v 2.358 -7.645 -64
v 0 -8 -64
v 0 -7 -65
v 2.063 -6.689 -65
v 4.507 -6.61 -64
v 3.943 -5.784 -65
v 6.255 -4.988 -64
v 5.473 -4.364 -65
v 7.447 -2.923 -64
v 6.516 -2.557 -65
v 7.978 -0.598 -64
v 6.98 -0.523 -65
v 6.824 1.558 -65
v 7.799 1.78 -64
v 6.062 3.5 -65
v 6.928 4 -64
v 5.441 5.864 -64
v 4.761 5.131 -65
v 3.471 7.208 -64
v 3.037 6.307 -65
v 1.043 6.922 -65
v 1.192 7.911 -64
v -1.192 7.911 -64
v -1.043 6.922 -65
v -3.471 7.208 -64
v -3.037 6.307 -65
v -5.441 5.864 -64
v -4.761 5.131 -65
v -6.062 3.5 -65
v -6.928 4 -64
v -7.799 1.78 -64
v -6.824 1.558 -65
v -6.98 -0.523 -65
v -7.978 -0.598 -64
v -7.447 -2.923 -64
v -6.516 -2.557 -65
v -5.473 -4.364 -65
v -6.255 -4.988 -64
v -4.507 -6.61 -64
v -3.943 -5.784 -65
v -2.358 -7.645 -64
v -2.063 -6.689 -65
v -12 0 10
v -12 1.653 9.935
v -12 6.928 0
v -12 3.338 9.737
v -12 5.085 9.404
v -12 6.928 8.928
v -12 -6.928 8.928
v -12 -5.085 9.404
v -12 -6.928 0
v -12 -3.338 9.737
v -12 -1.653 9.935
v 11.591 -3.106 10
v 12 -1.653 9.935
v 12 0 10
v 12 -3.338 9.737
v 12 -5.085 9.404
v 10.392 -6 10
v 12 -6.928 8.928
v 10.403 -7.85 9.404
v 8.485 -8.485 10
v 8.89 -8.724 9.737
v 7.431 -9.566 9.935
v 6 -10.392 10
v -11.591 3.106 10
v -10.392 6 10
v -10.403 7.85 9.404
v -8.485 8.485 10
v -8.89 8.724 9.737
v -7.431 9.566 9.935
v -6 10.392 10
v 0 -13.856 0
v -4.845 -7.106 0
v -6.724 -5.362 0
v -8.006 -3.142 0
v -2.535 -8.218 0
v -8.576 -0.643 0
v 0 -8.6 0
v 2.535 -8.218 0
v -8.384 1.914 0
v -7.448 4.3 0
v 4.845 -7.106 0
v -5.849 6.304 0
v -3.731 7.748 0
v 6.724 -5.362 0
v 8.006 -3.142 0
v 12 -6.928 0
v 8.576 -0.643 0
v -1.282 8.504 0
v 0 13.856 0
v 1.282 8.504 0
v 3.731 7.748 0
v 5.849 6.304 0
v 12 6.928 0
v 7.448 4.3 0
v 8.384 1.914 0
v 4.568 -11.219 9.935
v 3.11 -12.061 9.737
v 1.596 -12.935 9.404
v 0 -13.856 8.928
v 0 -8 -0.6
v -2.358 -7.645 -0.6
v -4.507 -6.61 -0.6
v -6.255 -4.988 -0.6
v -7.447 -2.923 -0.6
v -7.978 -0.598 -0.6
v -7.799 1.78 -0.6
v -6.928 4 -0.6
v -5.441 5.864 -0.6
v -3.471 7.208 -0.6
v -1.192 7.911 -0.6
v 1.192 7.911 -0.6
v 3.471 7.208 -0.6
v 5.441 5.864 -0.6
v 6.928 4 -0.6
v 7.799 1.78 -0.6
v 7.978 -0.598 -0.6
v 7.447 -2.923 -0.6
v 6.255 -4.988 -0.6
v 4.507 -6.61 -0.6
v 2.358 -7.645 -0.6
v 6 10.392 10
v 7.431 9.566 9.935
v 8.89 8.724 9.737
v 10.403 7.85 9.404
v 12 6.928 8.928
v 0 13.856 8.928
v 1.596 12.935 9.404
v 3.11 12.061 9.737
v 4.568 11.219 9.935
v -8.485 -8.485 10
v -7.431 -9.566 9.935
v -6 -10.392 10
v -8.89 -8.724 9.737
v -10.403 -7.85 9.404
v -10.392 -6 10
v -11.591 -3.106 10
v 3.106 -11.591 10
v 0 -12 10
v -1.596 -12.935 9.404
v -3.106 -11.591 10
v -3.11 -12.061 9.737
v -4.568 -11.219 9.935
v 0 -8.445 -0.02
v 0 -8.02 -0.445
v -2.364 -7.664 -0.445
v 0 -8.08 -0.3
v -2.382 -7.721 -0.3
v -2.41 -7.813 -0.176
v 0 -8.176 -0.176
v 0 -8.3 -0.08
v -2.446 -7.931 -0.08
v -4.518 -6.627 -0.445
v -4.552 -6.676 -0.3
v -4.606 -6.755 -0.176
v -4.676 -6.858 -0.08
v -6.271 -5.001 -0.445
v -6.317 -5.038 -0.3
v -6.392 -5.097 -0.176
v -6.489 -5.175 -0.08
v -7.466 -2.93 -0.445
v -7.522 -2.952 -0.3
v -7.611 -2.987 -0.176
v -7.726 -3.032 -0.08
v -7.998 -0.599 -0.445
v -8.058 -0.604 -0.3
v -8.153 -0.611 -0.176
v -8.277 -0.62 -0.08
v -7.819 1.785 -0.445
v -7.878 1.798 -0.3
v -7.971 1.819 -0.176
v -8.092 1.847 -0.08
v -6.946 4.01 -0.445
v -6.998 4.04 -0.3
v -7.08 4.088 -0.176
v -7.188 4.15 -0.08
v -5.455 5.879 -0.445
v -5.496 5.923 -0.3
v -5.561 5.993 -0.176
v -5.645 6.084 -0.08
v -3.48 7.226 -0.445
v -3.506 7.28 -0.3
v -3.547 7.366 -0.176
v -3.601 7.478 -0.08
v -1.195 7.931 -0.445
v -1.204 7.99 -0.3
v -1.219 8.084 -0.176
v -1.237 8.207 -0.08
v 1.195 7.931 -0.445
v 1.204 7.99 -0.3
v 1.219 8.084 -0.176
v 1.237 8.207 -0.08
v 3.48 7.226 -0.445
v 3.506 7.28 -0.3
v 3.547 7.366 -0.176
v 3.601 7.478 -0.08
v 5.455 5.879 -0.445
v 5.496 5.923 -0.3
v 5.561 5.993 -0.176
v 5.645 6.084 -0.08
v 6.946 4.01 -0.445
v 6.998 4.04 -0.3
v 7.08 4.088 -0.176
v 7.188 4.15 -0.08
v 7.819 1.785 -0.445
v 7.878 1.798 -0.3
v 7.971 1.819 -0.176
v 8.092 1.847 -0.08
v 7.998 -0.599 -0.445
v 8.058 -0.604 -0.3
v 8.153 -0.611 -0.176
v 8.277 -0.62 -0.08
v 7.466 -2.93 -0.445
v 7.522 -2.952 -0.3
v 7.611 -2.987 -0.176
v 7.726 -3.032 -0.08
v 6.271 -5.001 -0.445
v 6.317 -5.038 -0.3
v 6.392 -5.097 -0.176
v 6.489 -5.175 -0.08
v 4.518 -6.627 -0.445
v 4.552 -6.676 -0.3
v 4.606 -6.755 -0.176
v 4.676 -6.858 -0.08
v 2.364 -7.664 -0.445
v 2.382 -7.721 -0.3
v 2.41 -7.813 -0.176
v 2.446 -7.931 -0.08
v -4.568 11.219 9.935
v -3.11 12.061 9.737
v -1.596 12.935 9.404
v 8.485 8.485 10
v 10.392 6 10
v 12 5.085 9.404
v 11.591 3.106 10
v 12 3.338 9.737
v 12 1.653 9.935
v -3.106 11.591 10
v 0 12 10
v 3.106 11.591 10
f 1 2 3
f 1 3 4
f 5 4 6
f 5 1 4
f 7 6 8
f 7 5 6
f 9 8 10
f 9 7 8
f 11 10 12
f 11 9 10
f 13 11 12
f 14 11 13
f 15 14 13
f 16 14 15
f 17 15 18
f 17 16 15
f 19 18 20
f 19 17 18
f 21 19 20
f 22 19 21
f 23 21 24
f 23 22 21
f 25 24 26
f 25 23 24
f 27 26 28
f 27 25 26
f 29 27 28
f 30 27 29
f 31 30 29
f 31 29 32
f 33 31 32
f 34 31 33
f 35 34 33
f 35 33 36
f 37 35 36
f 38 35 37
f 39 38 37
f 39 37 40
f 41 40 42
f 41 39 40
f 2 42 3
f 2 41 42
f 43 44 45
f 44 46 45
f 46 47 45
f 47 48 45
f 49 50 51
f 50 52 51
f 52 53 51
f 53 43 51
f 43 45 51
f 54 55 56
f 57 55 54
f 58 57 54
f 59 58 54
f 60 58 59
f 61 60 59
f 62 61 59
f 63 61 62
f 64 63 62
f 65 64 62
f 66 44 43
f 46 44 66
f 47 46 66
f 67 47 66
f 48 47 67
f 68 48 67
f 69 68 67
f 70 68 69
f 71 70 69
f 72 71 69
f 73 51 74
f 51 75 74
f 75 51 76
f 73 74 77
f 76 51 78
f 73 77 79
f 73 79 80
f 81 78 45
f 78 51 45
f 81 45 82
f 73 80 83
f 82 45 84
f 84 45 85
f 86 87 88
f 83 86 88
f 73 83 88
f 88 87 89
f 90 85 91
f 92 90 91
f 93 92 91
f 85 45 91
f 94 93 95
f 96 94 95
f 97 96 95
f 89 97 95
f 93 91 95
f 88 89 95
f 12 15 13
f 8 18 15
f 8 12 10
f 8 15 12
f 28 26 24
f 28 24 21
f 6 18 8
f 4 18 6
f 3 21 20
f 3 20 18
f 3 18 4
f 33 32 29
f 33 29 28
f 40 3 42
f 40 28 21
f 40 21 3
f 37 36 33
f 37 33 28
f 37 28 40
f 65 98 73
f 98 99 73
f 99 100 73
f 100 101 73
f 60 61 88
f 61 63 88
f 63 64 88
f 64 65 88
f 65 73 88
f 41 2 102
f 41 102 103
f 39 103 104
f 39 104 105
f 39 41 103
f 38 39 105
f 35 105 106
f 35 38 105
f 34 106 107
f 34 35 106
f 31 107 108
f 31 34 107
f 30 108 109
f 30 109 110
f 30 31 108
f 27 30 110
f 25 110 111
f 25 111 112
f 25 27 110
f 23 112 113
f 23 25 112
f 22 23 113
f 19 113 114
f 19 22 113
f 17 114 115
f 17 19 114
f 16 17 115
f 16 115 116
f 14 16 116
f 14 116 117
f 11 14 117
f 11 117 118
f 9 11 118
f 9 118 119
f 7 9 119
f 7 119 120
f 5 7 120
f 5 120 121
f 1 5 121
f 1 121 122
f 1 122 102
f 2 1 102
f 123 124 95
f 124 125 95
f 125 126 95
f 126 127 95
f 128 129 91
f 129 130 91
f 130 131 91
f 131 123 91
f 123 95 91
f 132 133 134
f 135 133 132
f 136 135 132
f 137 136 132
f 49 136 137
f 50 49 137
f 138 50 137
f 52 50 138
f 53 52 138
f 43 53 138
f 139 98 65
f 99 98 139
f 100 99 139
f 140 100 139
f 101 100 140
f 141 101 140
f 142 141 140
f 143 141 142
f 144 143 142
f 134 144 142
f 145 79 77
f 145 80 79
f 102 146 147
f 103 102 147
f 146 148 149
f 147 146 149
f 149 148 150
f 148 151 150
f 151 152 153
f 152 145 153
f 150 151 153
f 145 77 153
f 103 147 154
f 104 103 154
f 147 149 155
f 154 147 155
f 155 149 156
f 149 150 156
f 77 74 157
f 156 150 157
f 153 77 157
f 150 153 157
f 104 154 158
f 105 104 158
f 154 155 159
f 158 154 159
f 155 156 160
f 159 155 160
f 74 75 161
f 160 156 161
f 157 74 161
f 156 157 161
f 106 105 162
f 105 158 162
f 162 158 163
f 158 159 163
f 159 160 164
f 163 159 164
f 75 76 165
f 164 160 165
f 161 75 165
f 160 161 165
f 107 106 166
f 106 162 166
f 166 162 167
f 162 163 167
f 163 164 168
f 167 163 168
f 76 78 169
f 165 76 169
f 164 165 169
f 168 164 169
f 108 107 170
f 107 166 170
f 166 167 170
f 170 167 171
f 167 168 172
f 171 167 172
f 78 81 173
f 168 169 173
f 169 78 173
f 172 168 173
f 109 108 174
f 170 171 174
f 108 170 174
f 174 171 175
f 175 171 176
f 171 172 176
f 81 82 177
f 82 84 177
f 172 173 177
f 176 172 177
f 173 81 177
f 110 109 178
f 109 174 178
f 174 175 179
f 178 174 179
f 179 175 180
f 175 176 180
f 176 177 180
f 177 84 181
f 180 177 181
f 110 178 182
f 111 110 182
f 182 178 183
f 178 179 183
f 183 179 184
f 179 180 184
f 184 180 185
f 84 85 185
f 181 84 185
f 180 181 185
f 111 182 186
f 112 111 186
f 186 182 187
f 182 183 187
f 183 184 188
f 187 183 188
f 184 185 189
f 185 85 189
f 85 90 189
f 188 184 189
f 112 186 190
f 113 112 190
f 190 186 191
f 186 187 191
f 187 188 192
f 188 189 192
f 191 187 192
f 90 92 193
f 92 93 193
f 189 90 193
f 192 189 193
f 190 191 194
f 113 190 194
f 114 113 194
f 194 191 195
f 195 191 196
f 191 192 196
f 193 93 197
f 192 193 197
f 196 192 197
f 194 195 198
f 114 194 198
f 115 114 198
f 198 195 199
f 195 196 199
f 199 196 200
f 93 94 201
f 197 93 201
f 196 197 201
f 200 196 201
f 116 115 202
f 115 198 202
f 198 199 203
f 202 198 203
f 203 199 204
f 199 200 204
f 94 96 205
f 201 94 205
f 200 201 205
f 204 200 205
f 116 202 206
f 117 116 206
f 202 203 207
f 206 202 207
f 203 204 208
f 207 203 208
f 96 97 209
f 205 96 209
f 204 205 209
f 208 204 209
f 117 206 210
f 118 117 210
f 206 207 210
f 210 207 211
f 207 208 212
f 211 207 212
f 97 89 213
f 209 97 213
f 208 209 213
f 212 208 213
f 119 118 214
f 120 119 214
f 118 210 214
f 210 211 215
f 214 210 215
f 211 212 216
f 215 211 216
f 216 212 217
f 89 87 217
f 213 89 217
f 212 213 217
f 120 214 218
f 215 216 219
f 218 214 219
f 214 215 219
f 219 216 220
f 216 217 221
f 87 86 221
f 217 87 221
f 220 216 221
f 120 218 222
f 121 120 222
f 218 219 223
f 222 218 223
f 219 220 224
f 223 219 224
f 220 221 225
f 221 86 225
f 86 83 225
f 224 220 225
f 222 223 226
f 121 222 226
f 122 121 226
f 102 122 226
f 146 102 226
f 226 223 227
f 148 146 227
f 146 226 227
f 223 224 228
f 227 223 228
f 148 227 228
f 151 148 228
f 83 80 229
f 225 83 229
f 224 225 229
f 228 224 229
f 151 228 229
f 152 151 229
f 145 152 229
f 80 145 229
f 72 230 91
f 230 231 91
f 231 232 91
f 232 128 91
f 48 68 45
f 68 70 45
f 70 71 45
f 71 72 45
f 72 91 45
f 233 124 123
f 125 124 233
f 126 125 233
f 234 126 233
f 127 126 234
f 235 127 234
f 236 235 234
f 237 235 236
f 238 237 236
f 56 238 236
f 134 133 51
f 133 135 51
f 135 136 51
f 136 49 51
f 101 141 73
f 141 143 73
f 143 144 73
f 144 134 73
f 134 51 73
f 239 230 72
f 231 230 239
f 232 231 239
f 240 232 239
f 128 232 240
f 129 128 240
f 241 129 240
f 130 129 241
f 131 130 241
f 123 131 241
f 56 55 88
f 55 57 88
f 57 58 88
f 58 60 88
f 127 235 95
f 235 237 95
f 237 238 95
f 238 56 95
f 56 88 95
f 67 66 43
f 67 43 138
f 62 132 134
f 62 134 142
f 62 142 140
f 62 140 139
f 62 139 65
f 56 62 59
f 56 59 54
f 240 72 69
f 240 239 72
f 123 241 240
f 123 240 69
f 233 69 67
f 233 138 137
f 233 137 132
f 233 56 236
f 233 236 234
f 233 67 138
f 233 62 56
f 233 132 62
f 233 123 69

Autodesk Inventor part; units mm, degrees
ref_plane "WorkPlane1" through (0, 0, 0) normal (0, 0, 1) x (1, 0, 0)
sketch "Sketch1" plane through (0, 0, 0) normal (0, 0, 1) x (1, 0, 0)
  point P0 (0, 0)
sketch "Sketch2" plane through (0, 0, 0) normal (0, 0, 1) x (1, 0, 0)
  line L0 (-12, 6.9284) -> (-12, -6.9284)
  line L1 (0, 13.8562) -> (-12, 6.9284)
  line L2 (12, 6.9284) -> (0, 13.8562)
  line L3 (12, -6.9284) -> (12, 6.9284)
  line L4 (0, -13.8562) -> (12, -6.9284)
  line L5 (-12, -6.9284) -> (0, -13.8562)
  circle A0 centre (0, 0) radius 12 construction
  dimension "d1" = 24
  dimension "d29" = 0
  dimension "d30" = 0
extrude "Extrusion1" add sketch "Sketch2" along normal blind 10
sketch "Sketch3" plane through (0, 0, 0) normal (1, 0, 0) x (0, 1, 0)
  line L0 (12, 10) -> (13.9562, 10)
  line L1 (13.9562, 8.8706) -> (12, 10)
  line L2 (13.9562, 10) -> (13.9562, 8.8706)
  line L3 (0, -2) -> (0, 12) projected
  line L4 (13.8562, 0) -> (13.8562, 10) projected
  dimension "d25" = 0.1
  dimension "d26" = 0
  dimension "d27" = 60
  dimension "d28" = 12
revolve "Revolution1" cut sketch "Sketch3" angle 360 about axis through (0, 0, -10) along (0, 0, 1)
sketch "Sketch4" plane through (0, 0, 0) normal (1, 0, 0) x (0, 1, 0)
  line L0 (0, -65) -> (0, 0)
  line L1 (-8, -65) -> (0, -65)
  line L2 (-8, 0) -> (-8, -65)
  line L3 (0, 0) -> (-8, 0)
  line L4 (0, -65) -> (0, 0)
  line L5 (-9.6, 0) -> (1.6, 0) projected
  line L6 (0, -78) -> (0, 13) projected
  dimension "d18" = 8
  dimension "d20" = 65
  dimension "d33" = 0
  dimension "d34" = 0
revolve "Revolution2" add sketch "Sketch4" angle 360 about axis through (0, 0, -65) along (0, 0, -1)
chamfer "Chamfer1" distance 1 angle 45 1 edges at (0, 8, -65)
fillet "Fillet1" radius 0.6 1 edges at (0, 8, 0)
thread "Thread1" size "M16x2" class "6g" standard "ISO Metric profile" length 38
ref_plane "MSC_PF1" through (0, 0, 0) normal (1, 0, 0) x (0, 1, 0)
ref_plane "MSC_PT1" through (0, 0, 0) normal (0, 0, -1) x (-1, 0, 0)
equation "\"d22\" = 0.5 * PTC"
equation "\"d23\" = 0.5 * PTC"
equation "\"d24\" = r"
equation "\"d1\" = ParS"
equation "\"d6\" = ParK"
equation "\"d28\" = 0.5 * ParS"
equation "\"d18\" = 0.5 * NND"
equation "\"d20\" = NLG"
equation "\"NND\" = 16"
equation "\"NLG\" = 65"
equation "\"PTC\" = 2"
equation "\"ParK\" = 10"
equation "\"ParS\" = 24"
equation "\"msp_es\" = 0.577367 * ParS"
equation "\"r\" = 0.6"
equation "\"THREADDIA\" = NND"
properties part number "ISO 4016 - M16 x 65" material "Steel"
